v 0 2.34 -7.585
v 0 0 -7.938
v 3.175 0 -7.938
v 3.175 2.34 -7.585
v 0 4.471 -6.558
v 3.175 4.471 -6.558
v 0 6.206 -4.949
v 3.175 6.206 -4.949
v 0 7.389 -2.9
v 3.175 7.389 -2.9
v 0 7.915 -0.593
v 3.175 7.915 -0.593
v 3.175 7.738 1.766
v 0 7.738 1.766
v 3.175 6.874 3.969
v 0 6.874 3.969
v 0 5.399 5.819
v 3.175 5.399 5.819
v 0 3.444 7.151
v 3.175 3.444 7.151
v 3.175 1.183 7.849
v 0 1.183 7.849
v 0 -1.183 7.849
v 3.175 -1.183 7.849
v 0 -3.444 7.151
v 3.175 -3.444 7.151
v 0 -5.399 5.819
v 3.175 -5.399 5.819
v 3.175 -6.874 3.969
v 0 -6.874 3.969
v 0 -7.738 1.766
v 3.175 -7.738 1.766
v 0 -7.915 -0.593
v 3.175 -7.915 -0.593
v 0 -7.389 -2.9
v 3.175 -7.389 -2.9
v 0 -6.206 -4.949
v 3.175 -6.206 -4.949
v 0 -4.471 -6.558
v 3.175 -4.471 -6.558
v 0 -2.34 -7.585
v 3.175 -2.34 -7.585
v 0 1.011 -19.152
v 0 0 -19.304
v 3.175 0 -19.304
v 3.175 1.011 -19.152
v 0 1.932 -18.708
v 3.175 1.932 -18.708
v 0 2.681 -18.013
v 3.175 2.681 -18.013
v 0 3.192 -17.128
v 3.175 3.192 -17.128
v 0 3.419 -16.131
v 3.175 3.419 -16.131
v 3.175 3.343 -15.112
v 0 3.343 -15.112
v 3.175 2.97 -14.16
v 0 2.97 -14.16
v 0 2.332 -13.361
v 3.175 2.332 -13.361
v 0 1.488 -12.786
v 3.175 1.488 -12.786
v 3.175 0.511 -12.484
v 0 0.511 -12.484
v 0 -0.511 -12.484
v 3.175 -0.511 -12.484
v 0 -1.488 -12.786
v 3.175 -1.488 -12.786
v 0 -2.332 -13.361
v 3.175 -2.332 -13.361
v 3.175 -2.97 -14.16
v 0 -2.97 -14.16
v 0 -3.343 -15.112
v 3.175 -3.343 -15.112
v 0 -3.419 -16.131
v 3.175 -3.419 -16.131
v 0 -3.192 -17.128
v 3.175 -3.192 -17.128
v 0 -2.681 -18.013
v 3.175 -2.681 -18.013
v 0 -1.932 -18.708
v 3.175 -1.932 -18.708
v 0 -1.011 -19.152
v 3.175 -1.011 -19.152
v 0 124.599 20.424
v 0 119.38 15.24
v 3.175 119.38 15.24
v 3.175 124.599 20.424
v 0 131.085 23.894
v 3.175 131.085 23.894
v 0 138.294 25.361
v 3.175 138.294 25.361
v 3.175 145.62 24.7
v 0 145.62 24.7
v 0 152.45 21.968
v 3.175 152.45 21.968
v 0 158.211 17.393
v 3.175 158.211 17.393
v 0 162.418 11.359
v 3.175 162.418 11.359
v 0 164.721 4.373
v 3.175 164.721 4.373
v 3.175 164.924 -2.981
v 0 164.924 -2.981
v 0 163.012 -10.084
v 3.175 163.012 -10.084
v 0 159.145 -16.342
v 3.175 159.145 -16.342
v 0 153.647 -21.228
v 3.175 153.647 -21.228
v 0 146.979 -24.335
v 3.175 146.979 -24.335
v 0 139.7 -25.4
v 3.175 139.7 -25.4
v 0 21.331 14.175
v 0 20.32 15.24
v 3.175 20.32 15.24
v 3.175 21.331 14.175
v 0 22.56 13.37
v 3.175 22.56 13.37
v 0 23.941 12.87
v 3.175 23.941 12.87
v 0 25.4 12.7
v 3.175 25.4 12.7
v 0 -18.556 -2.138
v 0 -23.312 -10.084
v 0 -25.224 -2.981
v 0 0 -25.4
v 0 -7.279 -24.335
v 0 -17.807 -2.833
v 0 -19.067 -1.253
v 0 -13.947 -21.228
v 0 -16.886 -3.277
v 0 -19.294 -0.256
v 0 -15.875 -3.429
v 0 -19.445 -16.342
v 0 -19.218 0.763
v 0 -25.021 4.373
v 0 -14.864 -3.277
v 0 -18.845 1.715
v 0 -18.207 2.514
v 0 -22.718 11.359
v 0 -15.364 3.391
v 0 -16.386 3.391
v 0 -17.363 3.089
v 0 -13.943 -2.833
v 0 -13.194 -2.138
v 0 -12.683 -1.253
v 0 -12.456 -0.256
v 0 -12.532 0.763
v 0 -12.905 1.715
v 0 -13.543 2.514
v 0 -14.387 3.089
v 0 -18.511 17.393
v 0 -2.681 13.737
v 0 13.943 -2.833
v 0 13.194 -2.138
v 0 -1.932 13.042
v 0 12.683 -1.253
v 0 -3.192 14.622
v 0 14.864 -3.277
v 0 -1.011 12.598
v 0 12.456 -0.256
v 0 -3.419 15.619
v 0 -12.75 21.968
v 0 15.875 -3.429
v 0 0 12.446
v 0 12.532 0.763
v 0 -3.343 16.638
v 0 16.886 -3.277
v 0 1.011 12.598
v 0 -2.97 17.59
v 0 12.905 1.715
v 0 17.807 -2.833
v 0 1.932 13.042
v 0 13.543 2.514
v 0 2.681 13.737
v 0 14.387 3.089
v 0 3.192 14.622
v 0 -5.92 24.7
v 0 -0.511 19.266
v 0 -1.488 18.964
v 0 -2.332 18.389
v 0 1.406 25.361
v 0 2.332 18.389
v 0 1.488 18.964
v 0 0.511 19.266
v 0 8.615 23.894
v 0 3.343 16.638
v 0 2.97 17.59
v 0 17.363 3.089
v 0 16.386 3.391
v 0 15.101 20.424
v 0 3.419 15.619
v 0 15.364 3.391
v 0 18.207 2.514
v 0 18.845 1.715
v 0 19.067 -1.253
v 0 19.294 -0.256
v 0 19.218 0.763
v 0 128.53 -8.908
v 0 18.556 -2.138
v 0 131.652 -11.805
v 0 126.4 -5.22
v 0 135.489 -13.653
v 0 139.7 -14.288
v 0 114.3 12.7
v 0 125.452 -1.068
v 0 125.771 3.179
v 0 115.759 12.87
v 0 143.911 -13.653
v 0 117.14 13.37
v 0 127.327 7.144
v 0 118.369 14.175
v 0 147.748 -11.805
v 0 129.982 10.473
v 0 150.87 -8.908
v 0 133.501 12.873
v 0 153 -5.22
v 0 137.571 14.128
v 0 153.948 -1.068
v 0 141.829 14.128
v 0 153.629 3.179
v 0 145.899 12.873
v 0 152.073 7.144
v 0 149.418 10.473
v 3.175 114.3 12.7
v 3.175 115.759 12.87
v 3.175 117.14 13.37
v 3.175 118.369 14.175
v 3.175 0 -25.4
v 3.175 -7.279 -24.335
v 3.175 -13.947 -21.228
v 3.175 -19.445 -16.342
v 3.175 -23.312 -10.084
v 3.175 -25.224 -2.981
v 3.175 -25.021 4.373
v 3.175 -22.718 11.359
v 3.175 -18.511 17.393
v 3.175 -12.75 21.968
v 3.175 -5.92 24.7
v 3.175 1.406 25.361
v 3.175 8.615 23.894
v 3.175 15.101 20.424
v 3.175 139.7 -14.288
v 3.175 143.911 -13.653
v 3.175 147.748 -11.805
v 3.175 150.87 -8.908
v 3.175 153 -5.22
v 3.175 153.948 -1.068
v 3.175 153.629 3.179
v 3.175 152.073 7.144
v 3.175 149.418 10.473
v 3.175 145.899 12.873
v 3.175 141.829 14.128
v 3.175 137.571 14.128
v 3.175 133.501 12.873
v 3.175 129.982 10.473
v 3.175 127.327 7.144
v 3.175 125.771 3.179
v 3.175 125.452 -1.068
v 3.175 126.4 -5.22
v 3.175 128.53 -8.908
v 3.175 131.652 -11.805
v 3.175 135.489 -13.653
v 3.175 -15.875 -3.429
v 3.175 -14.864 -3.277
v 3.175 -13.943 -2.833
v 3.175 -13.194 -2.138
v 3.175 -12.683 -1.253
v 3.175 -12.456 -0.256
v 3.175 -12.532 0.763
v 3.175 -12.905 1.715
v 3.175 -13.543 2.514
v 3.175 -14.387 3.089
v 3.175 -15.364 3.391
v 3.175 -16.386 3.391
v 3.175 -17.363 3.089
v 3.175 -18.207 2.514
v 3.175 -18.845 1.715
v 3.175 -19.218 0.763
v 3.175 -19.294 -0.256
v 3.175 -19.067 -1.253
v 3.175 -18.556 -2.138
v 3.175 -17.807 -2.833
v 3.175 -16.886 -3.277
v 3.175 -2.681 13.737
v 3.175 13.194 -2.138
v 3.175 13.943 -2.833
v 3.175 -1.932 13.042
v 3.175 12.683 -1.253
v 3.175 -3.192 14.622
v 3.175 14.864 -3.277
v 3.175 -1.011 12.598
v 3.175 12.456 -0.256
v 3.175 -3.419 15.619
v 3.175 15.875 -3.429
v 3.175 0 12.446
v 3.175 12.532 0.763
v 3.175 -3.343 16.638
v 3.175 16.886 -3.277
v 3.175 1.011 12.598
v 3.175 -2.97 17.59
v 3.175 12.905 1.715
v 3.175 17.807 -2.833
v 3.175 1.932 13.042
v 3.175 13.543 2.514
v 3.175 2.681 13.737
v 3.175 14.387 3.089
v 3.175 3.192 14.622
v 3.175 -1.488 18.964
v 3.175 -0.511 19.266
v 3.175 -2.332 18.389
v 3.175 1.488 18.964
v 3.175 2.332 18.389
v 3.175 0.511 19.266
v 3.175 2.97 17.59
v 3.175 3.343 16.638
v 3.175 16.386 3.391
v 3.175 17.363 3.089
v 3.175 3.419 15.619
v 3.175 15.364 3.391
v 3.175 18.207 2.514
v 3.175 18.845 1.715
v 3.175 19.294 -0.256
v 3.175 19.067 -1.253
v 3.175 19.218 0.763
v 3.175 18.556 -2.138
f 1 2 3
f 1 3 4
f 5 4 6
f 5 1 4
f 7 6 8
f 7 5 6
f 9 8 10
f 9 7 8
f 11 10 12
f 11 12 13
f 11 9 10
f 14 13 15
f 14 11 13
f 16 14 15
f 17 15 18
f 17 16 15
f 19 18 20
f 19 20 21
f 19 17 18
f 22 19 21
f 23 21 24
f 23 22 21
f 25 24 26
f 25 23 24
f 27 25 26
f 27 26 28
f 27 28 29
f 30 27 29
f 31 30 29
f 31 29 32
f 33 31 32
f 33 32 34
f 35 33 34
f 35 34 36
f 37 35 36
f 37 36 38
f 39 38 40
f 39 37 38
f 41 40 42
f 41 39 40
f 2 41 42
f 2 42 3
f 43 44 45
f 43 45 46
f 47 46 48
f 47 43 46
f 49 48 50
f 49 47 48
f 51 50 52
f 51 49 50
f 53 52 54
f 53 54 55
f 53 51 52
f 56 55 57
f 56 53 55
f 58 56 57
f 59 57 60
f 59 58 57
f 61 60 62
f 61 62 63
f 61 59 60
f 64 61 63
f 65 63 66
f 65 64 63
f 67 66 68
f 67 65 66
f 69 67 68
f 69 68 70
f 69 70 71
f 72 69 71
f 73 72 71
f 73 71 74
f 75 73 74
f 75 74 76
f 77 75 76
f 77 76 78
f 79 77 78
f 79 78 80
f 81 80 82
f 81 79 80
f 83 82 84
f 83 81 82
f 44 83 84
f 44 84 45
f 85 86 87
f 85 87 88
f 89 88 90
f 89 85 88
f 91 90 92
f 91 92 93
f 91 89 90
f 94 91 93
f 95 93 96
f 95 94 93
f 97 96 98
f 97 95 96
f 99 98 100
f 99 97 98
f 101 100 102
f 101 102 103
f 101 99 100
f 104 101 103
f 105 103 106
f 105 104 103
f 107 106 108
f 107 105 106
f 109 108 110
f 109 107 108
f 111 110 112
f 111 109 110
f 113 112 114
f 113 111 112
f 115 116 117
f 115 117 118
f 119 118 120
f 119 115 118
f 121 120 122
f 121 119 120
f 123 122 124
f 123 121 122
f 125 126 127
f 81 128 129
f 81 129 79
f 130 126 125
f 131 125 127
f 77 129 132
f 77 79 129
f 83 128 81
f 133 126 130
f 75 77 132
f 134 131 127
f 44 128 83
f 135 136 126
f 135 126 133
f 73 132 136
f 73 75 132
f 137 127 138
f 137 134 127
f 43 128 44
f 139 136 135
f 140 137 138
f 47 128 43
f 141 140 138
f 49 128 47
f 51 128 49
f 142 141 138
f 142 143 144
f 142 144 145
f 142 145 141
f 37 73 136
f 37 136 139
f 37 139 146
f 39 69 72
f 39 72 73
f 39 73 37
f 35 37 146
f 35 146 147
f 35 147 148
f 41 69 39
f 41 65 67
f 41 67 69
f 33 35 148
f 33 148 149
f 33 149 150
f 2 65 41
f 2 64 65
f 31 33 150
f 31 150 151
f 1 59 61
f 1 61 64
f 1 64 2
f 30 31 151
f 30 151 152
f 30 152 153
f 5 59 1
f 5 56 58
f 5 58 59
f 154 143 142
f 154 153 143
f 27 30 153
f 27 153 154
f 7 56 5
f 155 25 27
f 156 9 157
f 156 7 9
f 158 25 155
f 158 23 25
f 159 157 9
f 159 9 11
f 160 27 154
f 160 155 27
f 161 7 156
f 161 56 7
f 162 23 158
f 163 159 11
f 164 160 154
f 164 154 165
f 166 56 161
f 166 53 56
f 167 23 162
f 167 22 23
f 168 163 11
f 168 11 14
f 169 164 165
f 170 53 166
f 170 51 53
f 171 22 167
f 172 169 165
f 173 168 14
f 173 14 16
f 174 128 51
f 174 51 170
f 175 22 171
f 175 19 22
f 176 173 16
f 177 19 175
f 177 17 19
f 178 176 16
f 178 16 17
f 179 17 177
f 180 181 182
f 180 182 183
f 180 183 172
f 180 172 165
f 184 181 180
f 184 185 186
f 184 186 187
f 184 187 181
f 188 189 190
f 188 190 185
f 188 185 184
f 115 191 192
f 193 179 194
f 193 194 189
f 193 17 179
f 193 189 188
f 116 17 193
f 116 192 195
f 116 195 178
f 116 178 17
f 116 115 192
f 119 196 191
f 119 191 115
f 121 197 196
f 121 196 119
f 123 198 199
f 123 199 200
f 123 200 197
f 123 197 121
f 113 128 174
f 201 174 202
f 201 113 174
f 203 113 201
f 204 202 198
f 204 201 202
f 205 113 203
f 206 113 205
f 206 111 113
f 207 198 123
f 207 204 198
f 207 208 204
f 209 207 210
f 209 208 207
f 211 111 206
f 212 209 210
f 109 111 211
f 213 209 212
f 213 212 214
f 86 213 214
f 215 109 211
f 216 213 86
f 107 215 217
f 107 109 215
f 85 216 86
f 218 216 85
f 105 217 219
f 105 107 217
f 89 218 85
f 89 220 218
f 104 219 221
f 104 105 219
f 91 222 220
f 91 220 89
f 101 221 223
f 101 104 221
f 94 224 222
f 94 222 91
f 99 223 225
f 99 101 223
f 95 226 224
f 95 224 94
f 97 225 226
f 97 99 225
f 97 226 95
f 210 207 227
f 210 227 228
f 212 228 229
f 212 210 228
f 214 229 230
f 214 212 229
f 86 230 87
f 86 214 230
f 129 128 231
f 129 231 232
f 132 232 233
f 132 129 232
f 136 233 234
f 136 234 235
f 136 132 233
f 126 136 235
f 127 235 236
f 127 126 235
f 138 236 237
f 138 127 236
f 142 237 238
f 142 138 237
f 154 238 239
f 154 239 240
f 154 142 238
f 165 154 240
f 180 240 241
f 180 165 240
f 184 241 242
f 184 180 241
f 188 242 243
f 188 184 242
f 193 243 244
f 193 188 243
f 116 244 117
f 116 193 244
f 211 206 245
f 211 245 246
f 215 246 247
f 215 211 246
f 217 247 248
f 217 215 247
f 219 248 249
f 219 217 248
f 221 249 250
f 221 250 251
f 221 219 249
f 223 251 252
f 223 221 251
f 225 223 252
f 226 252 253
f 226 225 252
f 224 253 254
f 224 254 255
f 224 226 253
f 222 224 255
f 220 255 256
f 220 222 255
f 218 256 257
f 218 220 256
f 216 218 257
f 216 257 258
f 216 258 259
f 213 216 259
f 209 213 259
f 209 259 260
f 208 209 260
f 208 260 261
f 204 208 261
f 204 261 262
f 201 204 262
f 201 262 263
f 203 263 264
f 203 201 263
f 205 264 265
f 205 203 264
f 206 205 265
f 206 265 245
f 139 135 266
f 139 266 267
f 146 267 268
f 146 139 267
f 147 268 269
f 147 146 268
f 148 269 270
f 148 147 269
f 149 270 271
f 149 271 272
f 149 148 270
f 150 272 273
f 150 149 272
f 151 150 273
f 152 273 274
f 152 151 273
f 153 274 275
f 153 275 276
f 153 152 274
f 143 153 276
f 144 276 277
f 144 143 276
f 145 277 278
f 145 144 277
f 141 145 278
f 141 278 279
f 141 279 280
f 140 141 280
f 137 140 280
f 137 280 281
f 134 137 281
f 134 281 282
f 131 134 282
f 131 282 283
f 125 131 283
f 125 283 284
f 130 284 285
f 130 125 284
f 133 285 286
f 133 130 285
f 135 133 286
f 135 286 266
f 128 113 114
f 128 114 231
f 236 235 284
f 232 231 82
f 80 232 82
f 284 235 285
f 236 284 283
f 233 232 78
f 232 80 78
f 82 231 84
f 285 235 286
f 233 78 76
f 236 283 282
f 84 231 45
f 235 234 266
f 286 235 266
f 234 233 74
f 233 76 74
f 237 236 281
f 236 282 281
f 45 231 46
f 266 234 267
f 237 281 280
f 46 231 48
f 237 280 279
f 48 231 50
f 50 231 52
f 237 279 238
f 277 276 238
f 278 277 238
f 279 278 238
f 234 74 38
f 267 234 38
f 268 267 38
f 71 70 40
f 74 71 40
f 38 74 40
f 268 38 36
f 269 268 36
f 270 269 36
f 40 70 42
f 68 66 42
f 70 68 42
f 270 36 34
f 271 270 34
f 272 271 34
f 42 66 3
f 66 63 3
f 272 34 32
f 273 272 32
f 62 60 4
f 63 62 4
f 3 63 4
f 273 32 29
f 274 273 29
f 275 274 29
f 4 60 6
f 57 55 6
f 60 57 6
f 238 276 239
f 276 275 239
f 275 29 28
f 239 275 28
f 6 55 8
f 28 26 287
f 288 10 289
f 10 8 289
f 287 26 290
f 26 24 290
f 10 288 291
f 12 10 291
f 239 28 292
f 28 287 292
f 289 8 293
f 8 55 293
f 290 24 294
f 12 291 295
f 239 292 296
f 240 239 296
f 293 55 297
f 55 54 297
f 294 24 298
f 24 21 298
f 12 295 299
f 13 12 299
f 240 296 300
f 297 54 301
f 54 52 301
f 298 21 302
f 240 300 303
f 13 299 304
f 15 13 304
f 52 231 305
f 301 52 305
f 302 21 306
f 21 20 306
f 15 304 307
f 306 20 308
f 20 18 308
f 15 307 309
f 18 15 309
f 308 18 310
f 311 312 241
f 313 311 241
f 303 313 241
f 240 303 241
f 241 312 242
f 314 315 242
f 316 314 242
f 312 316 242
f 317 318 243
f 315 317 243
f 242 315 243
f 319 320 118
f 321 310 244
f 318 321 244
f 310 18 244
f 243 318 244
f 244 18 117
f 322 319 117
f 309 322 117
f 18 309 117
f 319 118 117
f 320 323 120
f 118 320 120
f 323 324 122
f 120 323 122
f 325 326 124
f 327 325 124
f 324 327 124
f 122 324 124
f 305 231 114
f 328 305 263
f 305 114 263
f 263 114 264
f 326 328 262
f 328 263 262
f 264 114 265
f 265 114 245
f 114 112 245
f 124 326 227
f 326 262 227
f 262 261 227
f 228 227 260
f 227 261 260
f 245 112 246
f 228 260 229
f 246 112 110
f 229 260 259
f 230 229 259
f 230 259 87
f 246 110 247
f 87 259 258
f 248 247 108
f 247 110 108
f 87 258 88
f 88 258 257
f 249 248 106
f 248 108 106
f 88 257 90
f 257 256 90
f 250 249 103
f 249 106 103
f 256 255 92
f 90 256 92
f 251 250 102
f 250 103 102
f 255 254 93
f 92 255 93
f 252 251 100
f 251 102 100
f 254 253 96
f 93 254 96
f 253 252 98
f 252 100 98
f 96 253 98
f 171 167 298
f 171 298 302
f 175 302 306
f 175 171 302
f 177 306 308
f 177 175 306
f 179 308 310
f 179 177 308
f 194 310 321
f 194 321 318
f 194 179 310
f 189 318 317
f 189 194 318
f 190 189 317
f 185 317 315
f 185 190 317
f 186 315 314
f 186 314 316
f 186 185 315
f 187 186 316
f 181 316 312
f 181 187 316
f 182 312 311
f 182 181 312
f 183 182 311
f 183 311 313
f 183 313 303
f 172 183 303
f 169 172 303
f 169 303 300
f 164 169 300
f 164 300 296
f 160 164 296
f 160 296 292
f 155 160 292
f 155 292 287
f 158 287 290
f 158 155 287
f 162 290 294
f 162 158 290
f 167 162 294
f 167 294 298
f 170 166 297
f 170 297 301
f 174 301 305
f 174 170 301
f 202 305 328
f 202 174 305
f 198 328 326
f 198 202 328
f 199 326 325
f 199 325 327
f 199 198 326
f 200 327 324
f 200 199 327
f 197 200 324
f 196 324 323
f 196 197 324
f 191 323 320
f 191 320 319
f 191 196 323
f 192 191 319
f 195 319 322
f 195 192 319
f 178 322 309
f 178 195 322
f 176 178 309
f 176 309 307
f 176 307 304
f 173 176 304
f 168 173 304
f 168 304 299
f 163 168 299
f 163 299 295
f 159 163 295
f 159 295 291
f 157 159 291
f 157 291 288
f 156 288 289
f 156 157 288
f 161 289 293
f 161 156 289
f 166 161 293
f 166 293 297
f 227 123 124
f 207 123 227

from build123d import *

# Parameters (mm, degrees)
SKETCH1_R           = 7.9375
SKETCH1_R_2         = 14.2875
SKETCH1_R_3         = 3.429
BOSS_EXTRUDE1_DEPTH = 3.175


with BuildPart() as part:
    # Sketch1 → Boss-Extrude1 (new body)
    with BuildSketch(Plane(origin=(0, 0, 0), x_dir=(0, 0, -1), z_dir=(1, 0, 0))):
        with BuildLine():
            Line((25.4, 139.7), (25.4, 0))
            ThreePointArc((25.4, 0), (-11.359225326, -22.718450651), (-15.24, 20.32))
            ThreePointArc((-15.24, 20.32), (-13.370387337, 22.560193669), (-12.7, 25.4))
            Line((-12.7, 25.4), (-12.7, 114.3))
            ThreePointArc((-12.7, 114.3), (-13.370387337, 117.139806331), (-15.24, 119.38))
            ThreePointArc((-15.24, 119.38), (-11.359225326, 162.418450651), (25.4, 139.7))
        make_face()
        Circle(SKETCH1_R, mode=Mode.SUBTRACT)
        with Locations((0, 139.7)):
            Circle(SKETCH1_R_2, mode=Mode.SUBTRACT)
        with Locations((0, 15.875)):
            Circle(SKETCH1_R_3, mode=Mode.SUBTRACT)
        with Locations((15.875, 0)):
            Circle(SKETCH1_R_3, mode=Mode.SUBTRACT)
        with Locations((0, -15.875)):
            Circle(SKETCH1_R_3, mode=Mode.SUBTRACT)
        with Locations((-15.875, 0)):
            Circle(SKETCH1_R_3, mode=Mode.SUBTRACT)
    extrude(amount=BOSS_EXTRUDE1_DEPTH)


solid = part.part
